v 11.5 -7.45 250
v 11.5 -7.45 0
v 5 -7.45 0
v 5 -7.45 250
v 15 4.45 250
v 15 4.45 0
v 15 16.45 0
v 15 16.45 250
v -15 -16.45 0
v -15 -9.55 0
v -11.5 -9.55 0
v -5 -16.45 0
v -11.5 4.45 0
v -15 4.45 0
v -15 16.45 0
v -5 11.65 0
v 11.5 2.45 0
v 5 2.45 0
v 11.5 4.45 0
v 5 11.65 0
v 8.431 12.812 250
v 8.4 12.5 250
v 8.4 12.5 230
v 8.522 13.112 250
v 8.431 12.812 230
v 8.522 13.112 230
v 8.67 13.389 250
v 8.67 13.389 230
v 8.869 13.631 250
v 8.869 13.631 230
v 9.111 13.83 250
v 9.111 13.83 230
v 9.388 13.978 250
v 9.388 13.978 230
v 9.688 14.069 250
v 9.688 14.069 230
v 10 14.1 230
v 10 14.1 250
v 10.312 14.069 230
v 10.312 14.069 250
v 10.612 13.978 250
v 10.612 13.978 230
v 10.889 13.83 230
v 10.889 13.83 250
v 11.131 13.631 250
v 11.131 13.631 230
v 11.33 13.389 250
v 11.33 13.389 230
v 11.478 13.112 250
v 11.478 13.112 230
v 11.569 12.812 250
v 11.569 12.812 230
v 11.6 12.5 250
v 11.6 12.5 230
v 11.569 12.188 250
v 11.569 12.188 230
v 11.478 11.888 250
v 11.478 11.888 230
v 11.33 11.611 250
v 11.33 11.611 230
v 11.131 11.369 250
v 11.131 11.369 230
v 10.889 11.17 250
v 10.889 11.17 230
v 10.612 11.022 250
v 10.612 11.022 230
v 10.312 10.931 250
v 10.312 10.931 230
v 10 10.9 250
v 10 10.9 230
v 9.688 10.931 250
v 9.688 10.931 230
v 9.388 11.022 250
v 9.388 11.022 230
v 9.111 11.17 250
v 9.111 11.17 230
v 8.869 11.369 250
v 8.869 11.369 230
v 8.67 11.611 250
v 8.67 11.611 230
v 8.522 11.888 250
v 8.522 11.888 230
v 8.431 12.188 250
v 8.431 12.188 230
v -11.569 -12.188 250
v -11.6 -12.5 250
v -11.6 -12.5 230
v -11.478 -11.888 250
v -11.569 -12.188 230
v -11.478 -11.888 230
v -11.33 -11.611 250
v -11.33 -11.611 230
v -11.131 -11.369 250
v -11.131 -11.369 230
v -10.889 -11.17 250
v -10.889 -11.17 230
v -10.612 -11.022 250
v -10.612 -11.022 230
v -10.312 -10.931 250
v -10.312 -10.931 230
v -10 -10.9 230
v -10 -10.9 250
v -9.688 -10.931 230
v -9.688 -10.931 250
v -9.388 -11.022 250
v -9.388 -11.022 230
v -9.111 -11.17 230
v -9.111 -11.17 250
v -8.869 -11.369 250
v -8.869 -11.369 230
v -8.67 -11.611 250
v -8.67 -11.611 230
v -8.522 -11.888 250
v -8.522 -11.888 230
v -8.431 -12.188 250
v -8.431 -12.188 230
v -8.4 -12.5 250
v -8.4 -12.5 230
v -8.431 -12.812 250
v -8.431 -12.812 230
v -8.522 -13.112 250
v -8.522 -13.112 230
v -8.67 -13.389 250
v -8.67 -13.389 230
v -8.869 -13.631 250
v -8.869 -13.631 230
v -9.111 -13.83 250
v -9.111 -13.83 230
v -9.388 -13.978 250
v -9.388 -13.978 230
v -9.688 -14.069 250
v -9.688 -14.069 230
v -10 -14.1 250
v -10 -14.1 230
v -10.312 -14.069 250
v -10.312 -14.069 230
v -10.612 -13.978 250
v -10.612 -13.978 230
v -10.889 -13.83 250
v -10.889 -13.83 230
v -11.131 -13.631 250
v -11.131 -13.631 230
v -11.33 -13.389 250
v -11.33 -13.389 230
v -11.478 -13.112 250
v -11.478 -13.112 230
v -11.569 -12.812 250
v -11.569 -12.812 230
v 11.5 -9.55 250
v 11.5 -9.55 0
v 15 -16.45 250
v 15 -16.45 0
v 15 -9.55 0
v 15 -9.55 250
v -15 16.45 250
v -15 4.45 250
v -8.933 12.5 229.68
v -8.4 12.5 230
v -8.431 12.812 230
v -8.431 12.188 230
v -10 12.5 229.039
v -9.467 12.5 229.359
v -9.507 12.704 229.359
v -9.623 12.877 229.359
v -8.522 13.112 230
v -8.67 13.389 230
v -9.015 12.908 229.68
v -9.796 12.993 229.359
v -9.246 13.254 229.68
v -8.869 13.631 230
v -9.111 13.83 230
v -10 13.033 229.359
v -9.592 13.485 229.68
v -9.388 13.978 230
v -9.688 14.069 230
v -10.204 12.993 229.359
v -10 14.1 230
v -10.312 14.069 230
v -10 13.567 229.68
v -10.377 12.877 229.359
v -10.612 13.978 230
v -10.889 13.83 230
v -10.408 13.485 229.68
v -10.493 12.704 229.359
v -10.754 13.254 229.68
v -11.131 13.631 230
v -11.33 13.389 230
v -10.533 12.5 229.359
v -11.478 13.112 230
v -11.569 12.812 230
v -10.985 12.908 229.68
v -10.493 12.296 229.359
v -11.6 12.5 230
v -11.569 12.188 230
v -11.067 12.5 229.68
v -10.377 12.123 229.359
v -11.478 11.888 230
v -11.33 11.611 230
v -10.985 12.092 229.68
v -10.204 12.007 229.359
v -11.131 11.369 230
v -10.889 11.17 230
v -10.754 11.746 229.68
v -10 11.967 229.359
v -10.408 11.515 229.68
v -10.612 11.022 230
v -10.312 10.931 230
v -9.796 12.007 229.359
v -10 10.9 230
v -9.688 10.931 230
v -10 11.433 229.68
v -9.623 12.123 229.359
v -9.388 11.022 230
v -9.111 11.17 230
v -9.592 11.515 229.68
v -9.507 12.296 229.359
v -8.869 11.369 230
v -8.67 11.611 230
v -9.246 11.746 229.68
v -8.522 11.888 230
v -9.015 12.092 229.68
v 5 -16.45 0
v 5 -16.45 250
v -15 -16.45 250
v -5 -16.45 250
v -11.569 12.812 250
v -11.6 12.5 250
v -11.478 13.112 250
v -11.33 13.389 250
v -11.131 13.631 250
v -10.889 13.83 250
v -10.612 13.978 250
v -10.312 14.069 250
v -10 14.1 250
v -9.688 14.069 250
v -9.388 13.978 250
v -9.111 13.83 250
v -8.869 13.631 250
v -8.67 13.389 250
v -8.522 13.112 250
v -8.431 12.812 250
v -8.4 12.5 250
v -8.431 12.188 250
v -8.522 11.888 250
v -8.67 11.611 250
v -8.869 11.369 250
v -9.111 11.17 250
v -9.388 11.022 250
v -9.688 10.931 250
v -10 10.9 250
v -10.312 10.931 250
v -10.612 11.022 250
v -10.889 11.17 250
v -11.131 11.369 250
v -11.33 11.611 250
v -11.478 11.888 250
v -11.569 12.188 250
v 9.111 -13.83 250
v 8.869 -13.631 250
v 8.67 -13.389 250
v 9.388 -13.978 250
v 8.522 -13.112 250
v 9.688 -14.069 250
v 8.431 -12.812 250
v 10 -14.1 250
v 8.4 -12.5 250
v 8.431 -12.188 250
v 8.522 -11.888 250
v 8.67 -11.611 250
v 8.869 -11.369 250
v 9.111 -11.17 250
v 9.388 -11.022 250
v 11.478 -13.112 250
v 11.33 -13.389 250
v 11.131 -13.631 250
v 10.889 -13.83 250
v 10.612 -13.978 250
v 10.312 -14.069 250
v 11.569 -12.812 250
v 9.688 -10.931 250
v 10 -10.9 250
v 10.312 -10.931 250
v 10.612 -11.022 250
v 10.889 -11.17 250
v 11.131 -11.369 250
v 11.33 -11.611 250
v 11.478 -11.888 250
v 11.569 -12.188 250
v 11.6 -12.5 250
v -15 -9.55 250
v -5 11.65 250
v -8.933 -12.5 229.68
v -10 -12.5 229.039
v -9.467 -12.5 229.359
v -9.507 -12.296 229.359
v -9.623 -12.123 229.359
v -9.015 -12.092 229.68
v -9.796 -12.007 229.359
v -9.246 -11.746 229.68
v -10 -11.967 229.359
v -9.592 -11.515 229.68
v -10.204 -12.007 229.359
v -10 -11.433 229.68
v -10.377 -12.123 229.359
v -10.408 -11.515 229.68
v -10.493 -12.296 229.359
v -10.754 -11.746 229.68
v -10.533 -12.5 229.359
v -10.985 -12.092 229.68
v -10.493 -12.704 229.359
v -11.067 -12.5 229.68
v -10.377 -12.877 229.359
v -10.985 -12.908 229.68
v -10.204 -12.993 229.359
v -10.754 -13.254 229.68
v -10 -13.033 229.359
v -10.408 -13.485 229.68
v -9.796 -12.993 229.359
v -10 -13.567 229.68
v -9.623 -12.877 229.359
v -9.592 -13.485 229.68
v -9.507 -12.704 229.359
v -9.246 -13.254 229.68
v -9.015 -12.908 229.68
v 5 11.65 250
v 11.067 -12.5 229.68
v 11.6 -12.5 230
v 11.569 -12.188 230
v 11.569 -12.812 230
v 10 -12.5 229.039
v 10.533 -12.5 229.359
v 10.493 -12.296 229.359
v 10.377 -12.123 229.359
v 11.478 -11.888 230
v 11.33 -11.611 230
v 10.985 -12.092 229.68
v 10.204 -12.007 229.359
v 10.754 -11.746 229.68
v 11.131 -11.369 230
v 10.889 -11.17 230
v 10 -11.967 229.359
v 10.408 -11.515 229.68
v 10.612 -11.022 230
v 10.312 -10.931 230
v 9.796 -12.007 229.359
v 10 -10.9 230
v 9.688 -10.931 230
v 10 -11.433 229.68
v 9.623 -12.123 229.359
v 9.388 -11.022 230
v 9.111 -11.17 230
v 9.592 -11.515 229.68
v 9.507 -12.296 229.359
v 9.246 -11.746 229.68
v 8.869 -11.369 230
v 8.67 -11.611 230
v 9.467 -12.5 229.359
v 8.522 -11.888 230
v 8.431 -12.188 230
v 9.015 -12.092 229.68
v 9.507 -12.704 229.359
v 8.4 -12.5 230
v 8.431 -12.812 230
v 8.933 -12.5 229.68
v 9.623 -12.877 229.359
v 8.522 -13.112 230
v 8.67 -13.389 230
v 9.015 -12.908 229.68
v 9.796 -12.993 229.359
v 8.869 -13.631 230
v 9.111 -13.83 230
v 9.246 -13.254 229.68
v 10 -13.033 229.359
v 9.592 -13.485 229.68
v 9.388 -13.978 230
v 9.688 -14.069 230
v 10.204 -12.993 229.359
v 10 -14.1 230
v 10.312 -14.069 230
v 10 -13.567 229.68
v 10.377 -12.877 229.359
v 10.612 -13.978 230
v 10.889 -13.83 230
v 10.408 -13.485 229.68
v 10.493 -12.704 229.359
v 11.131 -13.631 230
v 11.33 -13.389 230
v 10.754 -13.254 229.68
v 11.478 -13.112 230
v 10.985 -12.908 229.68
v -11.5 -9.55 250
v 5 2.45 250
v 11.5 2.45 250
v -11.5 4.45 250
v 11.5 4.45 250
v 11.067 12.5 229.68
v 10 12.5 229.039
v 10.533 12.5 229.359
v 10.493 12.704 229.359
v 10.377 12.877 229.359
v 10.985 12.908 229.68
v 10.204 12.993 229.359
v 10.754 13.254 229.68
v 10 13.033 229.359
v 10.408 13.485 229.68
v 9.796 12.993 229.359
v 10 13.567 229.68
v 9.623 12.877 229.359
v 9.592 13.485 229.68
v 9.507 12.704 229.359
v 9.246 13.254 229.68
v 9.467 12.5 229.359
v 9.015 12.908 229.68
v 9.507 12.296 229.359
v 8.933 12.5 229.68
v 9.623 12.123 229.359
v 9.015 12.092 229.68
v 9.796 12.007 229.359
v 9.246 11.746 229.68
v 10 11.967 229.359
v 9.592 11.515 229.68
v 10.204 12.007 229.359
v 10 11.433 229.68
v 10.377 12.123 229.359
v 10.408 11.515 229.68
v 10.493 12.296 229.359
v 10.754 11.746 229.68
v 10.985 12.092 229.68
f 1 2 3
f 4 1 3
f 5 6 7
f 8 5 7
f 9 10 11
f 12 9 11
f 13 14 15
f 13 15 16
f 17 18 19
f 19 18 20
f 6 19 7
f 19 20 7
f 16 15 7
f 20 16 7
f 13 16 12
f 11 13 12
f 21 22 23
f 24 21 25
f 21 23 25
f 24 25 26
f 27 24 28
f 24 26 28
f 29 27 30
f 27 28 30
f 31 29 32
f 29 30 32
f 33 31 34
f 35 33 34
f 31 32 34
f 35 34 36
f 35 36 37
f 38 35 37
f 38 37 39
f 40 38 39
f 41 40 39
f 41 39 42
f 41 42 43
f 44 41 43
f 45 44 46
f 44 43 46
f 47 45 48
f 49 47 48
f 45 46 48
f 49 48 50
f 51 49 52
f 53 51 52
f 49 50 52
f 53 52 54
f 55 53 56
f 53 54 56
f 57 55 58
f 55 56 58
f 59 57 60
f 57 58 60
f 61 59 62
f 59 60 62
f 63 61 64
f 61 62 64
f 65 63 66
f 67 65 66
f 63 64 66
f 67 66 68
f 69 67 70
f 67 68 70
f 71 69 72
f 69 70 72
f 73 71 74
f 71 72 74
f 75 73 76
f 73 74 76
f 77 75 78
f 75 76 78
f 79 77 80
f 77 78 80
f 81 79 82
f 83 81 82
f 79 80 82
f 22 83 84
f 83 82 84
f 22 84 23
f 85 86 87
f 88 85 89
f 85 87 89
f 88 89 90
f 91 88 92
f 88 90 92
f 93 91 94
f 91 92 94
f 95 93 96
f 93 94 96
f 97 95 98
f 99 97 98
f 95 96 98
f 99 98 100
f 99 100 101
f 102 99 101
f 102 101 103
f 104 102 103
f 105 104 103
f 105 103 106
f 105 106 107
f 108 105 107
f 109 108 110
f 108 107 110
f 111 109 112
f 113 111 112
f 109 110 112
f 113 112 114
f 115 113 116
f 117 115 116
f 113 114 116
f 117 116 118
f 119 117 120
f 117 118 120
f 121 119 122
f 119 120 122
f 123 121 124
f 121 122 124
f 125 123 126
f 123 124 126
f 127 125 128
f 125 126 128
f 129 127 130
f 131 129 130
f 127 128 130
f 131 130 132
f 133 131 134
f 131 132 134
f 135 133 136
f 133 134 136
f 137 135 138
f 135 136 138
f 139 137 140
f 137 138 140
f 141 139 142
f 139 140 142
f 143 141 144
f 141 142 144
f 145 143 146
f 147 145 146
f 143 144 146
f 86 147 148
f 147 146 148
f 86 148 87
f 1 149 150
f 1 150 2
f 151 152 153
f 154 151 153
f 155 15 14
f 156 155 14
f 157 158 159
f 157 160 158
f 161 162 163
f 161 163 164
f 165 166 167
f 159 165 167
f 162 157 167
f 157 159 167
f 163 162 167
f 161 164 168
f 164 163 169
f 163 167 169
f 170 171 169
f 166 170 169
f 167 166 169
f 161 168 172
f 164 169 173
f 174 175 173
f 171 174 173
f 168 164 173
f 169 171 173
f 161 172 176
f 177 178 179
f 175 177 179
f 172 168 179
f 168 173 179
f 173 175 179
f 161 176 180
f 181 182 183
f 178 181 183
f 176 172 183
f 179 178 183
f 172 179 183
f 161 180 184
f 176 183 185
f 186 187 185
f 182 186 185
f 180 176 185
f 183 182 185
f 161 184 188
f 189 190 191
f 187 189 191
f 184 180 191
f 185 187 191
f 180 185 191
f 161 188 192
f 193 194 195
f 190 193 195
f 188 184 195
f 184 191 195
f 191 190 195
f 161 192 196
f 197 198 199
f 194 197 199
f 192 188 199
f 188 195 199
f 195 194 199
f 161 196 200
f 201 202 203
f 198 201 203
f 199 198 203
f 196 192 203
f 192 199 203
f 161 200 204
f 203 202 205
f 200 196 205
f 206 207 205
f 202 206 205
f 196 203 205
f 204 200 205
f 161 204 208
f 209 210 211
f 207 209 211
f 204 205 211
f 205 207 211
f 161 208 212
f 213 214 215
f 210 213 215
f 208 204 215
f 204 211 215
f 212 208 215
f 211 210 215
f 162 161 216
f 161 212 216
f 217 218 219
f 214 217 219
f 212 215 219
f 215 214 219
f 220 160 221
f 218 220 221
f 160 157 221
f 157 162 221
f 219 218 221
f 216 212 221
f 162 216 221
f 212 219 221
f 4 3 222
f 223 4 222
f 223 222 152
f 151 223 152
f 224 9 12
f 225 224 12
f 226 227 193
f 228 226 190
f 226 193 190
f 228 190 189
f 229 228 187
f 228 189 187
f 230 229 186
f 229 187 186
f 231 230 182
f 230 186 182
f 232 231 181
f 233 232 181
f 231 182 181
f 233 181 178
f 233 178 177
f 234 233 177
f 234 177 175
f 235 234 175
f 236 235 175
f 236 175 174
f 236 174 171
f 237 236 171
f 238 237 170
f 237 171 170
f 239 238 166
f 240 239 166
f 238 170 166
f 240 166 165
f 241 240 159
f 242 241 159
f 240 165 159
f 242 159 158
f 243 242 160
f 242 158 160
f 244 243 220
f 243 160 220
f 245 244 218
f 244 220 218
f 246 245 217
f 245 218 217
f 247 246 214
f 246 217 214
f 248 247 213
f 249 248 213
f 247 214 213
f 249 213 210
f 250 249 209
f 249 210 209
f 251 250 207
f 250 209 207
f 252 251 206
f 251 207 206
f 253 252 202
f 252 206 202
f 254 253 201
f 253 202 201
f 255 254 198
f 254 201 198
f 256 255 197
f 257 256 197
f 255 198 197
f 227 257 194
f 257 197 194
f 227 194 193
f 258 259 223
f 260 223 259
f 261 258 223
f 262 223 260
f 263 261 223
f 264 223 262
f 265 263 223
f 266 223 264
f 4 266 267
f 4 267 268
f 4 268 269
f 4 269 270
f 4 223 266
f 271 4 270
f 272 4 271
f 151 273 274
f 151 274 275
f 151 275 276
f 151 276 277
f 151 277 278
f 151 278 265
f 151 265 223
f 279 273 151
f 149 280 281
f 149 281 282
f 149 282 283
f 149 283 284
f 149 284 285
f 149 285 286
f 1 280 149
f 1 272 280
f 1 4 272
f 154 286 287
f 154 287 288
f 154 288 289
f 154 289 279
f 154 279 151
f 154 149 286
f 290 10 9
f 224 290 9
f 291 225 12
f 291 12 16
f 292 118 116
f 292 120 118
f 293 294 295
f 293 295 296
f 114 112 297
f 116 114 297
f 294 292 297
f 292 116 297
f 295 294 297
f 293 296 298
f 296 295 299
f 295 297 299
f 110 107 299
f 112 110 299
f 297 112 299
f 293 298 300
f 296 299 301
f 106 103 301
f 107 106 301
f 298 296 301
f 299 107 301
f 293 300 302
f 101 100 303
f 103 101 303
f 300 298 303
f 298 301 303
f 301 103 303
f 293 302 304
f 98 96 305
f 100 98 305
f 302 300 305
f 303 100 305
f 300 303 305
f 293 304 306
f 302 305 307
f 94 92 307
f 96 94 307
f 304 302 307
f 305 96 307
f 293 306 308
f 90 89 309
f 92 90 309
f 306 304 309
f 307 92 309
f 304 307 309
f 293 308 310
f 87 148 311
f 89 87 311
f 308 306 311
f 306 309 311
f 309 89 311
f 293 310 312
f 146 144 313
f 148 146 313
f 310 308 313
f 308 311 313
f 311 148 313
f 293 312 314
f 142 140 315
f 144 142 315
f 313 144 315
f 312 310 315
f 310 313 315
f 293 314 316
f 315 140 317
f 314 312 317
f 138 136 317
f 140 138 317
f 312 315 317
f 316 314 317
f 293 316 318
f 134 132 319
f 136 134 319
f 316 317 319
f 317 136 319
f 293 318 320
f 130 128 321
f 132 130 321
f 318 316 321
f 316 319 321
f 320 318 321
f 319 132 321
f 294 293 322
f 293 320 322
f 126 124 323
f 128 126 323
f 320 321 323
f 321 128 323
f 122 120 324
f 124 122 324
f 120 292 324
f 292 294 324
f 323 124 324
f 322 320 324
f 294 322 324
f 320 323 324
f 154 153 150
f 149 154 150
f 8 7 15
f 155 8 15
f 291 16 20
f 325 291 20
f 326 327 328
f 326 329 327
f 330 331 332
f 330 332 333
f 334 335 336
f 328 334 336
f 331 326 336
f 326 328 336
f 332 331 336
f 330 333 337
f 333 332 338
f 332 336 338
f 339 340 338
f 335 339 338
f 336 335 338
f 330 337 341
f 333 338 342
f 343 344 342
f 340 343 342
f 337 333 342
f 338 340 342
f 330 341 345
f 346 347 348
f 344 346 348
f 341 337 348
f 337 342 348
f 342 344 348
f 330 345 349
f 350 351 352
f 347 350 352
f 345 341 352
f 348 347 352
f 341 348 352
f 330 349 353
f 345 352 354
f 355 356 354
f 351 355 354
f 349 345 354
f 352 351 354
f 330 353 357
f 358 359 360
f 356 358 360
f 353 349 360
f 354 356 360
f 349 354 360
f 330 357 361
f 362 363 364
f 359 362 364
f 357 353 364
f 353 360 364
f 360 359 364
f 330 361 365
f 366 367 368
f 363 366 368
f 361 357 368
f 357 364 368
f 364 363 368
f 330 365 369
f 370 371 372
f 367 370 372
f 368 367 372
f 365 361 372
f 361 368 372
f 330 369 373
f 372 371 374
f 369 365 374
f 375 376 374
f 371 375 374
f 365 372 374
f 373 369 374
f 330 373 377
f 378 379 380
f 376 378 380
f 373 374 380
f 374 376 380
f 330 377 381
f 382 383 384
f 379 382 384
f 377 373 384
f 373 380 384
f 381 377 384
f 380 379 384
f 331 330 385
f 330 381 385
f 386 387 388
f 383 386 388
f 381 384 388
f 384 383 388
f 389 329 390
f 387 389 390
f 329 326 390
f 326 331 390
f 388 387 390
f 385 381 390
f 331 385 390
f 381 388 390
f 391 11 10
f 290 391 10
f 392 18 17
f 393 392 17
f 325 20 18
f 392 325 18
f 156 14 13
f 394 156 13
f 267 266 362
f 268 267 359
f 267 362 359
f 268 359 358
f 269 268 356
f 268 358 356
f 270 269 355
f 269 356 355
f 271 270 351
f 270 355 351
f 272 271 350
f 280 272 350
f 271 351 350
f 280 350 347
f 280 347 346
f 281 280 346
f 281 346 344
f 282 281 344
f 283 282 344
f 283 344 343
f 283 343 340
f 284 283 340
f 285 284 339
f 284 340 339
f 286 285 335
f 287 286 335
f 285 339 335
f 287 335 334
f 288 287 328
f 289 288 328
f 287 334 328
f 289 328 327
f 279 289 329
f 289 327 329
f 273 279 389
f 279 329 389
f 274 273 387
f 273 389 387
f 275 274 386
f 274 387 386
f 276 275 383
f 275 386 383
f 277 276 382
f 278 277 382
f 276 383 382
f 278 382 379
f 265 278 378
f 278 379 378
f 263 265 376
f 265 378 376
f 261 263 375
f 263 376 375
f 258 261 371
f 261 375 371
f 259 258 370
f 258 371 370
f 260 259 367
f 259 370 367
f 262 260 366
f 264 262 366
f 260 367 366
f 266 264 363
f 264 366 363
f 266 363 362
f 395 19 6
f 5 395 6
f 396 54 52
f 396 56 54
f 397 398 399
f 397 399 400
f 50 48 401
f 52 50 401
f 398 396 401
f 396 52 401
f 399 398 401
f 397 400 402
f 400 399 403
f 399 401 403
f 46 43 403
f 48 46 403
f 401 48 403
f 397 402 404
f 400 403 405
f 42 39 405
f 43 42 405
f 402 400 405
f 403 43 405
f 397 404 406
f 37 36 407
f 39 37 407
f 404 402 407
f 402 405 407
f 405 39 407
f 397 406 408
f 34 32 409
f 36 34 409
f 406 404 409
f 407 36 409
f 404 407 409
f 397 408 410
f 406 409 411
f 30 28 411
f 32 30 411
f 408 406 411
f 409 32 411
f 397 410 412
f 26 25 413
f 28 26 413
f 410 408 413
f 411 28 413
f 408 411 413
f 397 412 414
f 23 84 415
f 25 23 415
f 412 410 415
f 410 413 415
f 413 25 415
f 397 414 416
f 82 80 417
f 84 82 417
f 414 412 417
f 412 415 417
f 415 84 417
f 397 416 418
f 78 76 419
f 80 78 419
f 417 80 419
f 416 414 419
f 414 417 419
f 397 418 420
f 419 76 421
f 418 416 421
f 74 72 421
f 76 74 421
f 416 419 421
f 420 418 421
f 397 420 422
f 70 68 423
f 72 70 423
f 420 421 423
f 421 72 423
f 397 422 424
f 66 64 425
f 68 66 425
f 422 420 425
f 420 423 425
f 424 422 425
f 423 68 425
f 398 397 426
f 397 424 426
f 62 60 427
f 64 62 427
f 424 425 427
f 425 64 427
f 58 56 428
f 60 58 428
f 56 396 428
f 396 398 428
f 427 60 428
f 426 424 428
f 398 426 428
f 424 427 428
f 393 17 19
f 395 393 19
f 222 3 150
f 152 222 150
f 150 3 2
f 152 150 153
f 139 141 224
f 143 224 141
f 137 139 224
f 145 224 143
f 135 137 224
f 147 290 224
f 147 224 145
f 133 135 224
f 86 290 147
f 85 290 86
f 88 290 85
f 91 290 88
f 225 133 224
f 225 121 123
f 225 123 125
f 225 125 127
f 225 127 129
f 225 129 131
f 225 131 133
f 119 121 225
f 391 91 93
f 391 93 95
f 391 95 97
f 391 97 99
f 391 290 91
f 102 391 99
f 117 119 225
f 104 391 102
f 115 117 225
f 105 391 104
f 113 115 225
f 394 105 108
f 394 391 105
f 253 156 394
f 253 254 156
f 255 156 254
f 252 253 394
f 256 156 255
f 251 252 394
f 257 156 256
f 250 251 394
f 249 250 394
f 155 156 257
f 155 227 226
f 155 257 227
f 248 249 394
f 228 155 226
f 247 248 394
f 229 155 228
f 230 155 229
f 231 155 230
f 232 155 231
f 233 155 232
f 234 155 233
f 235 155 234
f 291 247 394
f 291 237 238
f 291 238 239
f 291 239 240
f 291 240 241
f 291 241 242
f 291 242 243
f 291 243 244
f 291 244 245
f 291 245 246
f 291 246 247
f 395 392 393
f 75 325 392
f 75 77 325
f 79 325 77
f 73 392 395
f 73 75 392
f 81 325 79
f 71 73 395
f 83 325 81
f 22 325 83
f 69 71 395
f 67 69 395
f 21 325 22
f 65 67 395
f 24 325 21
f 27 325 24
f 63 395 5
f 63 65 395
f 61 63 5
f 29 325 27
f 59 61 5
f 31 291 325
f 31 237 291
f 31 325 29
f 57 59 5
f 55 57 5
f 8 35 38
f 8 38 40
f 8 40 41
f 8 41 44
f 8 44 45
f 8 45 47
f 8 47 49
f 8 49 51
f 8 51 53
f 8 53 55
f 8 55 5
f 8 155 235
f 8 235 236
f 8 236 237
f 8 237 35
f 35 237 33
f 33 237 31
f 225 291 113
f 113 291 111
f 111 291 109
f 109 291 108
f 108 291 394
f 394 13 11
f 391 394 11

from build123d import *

# Parameters (mm, degrees)
F1_DEPTH   = 250
F3_D       = 3.2
F3_DEPTH   = 20
F3_TIP     = 0.9613769904
F3_2_D     = 3.2
F3_2_DEPTH = 20
F3_2_TIP   = 0.9613769904


with BuildPart() as f1:
    # F0 (on Top) → F1 (new body)
    with BuildSketch(Plane.XY):
        Polygon((5, 2.45), (11.5, 2.45), (11.5, 4.45), (15, 4.45), (15, 16.45), (-15, 16.45), (-15, 4.45), (-11.5, 4.45), (-11.5, -9.55), (-15, -9.55), (-15, -16.45), (-5, -16.45), (-5, 11.65), (5, 11.65), align=None)
    extrude(amount=F1_DEPTH)

    # F3
    with Locations(Plane.XY.offset(250)):
        with Locations((-10, 12.5), (10, 12.5), (10, -12.5), (-10, -12.5)):
            Hole(F3_D / 2, depth=F3_DEPTH)
            with Locations((0, 0, -(F3_DEPTH + F3_TIP / 2))):  # 118° drill point
                Cone(0, F3_D / 2, F3_TIP, mode=Mode.SUBTRACT)


with BuildPart() as f1b:
    # F0 (on Top) → F1, piece 2 (new body)
    with BuildSketch(Plane.XY):
        Polygon((11.5, -7.45), (5, -7.45), (5, -16.45), (15, -16.45), (15, -9.55), (11.5, -9.55), align=None)
    extrude(amount=F1_DEPTH)

    # F3#2
    with Locations(Plane.XY.offset(250)):
        with Locations((-10, 12.5), (10, 12.5), (10, -12.5), (-10, -12.5)):
            Hole(F3_2_D / 2, depth=F3_2_DEPTH)
            with Locations((0, 0, -(F3_2_DEPTH + F3_2_TIP / 2))):  # 118° drill point
                Cone(0, F3_2_D / 2, F3_2_TIP, mode=Mode.SUBTRACT)


solid = Compound([f1.part, f1b.part])
